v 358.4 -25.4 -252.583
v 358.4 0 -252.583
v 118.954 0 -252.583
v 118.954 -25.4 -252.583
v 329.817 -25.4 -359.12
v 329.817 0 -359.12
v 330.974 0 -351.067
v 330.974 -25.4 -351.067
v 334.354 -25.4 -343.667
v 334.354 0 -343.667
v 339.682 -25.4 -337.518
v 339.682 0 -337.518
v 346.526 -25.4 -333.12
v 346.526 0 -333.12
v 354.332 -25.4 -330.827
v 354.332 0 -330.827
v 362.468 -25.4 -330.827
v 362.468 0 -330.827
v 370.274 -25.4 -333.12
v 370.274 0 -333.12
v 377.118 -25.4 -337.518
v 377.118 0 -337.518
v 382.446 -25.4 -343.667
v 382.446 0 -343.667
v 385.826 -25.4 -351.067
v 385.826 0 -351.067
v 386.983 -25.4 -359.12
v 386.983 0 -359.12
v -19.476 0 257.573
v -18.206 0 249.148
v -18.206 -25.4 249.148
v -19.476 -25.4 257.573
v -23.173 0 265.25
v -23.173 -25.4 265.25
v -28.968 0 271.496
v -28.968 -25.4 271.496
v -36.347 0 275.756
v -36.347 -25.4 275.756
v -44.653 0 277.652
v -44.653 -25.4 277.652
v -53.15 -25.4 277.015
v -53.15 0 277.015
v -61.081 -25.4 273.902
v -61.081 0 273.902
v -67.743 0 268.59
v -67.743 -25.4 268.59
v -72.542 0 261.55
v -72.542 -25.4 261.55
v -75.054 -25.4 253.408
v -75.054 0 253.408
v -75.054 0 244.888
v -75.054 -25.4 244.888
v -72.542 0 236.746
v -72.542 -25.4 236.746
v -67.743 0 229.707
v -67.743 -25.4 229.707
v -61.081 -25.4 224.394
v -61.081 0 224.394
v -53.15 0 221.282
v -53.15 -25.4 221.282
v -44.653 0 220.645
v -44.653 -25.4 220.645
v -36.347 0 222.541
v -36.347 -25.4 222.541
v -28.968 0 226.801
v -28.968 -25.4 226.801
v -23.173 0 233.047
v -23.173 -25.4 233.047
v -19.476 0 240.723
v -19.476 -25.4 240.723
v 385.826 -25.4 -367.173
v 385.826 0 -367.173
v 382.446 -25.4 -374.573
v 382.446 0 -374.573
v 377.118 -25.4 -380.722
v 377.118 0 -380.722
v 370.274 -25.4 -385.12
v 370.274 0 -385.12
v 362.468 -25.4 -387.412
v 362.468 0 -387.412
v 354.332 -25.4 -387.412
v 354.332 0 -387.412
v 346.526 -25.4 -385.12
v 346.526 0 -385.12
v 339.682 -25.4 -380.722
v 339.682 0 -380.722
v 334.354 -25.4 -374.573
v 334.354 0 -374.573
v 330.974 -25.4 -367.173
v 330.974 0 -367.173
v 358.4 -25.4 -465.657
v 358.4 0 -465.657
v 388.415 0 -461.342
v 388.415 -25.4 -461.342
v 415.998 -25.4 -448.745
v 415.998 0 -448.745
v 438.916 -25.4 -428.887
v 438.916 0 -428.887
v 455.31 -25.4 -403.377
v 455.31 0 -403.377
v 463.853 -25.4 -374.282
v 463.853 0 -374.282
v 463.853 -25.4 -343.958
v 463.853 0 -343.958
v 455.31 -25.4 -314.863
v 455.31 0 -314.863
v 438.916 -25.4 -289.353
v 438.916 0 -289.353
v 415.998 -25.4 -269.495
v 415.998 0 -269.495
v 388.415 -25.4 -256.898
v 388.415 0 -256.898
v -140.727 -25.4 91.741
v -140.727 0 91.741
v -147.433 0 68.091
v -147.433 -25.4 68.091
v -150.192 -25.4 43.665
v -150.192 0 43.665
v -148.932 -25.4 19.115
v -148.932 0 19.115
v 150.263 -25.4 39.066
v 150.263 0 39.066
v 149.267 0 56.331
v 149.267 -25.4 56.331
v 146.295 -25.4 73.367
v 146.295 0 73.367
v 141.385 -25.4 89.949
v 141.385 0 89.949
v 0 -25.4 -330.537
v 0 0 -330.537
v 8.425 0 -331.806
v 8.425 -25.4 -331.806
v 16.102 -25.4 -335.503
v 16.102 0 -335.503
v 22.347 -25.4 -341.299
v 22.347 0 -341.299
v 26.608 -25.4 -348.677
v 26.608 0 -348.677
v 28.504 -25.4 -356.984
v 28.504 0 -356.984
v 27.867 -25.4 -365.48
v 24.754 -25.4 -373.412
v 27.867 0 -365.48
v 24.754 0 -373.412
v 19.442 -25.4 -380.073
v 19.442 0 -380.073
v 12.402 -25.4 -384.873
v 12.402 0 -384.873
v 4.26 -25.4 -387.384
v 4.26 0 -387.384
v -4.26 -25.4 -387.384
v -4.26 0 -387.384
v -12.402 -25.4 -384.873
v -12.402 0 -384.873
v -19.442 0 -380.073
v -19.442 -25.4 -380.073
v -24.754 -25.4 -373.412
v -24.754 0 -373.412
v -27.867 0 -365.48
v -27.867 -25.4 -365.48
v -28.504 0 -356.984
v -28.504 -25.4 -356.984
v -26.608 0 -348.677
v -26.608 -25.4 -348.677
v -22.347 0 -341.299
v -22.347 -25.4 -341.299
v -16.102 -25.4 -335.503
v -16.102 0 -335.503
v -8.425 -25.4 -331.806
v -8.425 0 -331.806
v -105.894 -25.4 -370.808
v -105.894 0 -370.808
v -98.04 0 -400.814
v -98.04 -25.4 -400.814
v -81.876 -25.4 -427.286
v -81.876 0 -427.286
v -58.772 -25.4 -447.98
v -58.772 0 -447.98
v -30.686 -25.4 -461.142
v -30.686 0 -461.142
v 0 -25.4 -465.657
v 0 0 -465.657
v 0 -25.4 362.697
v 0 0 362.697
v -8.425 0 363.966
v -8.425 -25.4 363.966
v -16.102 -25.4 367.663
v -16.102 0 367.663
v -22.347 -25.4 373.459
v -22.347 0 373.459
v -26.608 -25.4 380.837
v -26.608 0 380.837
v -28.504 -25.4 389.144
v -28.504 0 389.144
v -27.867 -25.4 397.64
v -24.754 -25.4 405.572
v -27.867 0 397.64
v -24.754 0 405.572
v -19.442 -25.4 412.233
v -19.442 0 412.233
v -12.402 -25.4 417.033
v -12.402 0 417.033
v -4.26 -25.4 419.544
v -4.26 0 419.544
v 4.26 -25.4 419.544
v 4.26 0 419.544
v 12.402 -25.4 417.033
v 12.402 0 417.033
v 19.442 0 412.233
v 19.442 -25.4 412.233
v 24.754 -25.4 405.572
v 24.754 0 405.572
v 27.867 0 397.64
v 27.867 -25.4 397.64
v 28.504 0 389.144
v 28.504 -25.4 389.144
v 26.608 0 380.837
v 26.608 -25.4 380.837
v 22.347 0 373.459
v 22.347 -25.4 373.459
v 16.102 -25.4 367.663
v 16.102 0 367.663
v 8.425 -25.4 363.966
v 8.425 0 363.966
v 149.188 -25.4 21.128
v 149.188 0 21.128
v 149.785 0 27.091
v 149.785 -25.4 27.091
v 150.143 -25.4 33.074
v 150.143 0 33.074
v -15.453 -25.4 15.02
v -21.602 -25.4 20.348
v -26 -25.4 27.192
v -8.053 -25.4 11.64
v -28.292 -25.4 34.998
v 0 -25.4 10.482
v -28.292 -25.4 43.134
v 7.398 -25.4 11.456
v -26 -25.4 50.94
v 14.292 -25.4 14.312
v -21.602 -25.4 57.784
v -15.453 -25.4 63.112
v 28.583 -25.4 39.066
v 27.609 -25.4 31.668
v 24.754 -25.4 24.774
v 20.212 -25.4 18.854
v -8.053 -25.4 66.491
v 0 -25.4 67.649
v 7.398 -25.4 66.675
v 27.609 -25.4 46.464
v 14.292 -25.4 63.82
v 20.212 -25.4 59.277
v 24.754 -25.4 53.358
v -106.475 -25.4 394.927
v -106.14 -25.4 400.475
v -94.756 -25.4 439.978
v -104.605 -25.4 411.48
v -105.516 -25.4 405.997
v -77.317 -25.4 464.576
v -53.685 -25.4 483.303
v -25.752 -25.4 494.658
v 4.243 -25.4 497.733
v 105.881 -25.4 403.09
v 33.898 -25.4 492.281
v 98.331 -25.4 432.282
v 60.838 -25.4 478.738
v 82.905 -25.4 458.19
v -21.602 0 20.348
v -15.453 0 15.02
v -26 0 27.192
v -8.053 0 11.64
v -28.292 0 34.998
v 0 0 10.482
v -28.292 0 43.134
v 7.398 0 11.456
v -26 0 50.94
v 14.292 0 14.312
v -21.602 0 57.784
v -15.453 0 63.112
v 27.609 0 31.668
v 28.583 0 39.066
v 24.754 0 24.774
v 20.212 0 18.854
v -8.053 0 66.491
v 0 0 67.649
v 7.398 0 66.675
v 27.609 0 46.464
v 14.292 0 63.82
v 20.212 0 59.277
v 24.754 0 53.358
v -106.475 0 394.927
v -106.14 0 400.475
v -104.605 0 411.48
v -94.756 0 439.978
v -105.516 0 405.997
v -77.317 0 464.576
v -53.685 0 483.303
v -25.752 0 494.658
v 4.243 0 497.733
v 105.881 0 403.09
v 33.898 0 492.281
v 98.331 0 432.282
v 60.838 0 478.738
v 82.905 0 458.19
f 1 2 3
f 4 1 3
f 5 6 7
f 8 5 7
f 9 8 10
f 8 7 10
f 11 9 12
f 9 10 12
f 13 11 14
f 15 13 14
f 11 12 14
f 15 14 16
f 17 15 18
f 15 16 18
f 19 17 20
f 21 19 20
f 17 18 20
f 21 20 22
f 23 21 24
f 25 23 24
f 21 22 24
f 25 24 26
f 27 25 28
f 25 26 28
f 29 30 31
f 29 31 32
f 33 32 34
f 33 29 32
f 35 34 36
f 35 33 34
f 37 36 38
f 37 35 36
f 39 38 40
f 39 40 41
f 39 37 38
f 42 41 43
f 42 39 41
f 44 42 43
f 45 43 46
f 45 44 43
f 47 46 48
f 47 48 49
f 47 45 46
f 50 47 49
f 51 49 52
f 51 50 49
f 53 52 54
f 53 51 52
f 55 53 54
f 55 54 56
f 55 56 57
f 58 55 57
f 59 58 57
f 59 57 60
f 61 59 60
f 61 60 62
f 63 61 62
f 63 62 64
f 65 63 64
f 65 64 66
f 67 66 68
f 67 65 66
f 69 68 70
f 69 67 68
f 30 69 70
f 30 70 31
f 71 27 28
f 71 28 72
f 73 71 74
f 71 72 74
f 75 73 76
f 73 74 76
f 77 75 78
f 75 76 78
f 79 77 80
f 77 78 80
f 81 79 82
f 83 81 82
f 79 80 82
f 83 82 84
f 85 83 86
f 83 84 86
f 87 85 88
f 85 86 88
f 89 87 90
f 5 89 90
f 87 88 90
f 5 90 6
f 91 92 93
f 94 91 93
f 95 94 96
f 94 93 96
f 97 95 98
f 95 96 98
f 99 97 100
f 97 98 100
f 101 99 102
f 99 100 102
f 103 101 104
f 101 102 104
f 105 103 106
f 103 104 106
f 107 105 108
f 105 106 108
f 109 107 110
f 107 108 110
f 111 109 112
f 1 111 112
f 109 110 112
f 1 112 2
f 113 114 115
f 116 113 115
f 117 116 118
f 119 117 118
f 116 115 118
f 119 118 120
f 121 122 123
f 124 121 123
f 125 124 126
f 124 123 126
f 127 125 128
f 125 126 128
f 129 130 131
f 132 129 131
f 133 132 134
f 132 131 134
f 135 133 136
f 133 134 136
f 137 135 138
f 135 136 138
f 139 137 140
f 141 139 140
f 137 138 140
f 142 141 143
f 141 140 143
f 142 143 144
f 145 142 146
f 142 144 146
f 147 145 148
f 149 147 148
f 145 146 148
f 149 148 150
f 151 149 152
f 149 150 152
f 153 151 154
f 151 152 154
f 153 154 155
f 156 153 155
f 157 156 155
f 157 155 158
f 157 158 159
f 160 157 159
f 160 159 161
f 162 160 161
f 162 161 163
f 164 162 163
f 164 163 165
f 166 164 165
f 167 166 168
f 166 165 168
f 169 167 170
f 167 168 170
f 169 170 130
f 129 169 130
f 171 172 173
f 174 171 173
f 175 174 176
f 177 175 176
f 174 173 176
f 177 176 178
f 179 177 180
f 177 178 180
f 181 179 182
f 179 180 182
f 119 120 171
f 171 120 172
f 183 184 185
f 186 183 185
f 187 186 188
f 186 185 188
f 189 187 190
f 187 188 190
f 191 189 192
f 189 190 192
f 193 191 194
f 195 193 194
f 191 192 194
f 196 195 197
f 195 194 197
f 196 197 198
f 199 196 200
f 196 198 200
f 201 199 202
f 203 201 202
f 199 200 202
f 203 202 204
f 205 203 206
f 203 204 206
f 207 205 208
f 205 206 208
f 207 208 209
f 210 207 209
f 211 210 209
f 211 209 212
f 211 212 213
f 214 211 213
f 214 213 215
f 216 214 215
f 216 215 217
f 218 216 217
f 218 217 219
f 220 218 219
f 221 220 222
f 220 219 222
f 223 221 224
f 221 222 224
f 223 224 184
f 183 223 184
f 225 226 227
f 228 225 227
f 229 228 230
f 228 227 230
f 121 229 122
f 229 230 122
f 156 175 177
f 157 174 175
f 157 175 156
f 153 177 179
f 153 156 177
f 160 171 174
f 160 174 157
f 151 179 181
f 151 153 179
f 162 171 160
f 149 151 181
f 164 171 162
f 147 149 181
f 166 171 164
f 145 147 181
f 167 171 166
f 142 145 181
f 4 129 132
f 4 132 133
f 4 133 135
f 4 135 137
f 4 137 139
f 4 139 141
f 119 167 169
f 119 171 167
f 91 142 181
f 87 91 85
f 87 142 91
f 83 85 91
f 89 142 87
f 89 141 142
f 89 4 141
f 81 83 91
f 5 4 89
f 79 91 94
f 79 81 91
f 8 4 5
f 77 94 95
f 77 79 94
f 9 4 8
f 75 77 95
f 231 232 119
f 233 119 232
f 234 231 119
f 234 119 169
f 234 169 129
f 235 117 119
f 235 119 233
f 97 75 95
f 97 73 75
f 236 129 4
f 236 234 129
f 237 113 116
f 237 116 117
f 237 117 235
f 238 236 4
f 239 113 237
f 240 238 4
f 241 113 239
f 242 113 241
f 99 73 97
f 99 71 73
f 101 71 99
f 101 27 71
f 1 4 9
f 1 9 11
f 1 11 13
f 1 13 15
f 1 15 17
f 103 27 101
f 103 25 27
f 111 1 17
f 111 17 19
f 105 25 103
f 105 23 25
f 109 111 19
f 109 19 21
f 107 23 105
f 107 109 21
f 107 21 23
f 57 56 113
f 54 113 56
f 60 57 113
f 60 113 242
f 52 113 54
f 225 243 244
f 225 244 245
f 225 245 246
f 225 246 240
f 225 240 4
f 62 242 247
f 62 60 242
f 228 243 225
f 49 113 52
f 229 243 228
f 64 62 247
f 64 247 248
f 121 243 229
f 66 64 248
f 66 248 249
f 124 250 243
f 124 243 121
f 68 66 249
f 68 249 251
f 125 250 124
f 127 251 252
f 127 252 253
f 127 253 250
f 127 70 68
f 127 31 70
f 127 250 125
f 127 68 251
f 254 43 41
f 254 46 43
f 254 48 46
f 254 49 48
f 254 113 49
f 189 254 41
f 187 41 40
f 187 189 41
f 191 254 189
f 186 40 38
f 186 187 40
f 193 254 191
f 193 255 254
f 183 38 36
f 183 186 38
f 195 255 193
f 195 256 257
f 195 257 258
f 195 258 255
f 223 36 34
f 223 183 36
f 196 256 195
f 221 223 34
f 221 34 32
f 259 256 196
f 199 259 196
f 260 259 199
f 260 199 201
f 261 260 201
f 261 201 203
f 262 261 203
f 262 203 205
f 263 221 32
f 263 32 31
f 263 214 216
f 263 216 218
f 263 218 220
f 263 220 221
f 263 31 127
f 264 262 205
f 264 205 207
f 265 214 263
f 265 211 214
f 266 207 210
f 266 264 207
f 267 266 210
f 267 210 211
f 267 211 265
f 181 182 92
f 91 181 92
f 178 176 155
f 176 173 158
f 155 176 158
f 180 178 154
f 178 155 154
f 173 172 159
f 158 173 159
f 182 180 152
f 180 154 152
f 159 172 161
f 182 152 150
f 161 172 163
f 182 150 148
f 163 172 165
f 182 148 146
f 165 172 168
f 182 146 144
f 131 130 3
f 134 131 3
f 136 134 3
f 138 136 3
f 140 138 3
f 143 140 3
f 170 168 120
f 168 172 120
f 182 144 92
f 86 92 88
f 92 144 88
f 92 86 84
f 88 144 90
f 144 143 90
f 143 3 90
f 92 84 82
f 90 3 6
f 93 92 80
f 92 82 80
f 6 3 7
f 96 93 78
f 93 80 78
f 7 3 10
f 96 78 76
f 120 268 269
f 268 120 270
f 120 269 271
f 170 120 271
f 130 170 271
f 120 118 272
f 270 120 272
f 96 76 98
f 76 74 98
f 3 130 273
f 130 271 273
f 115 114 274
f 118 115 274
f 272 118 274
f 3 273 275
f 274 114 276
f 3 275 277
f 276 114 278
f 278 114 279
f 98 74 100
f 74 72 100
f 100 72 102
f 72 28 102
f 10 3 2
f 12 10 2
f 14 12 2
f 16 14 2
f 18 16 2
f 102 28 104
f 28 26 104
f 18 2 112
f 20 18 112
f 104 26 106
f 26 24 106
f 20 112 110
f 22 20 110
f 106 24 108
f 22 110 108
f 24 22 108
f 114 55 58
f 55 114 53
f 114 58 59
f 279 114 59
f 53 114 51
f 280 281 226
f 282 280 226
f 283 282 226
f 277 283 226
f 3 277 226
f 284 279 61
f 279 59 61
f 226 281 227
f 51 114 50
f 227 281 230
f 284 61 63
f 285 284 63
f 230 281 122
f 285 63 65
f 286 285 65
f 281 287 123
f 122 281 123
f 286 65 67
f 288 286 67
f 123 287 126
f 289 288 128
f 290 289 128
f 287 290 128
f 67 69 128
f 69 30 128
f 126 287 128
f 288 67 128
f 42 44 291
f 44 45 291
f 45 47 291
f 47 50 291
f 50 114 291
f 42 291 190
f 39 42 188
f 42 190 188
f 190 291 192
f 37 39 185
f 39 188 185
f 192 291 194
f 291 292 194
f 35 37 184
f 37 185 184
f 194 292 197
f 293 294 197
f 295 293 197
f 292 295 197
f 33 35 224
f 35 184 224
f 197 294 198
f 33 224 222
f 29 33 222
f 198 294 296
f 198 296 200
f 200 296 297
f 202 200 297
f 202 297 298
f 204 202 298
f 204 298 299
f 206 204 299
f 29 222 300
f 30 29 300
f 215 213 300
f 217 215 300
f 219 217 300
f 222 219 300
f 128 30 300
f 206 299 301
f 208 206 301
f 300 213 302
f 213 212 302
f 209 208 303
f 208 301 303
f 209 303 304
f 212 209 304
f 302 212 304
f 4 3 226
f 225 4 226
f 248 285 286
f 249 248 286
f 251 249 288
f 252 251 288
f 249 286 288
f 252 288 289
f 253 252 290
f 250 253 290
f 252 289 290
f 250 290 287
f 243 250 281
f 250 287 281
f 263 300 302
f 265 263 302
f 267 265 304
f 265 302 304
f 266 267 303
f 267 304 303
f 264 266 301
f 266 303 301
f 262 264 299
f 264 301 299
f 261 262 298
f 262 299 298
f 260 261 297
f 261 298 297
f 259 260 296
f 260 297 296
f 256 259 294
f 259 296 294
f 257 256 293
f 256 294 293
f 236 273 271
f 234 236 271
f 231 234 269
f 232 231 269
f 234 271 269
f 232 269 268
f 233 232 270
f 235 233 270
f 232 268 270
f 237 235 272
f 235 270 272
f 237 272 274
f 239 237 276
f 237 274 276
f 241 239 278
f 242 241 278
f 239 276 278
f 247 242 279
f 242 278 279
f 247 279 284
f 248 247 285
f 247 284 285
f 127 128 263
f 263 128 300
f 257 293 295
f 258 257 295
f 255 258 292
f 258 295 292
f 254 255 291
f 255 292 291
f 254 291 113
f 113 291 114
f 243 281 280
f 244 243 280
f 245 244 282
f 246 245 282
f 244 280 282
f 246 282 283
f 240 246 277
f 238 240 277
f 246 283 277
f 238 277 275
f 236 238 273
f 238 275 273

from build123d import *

# Parameters (mm, degrees)
F0_R     = 28.5834260478
F1_DEPTH = 25.4


with BuildPart() as f1:
    # F0 (on Front) → F1 (new body)
    with BuildSketch(Plane.XZ):
        with BuildLine():
            Line((0, -111.1967209602), (0, 0))
            Line((0, 0), (0, 10.4824639664))
            ThreePointArc((0, 10.4824639664), (-28.5834260478, 39.0658900142), (0, 67.6493160619))
            Line((0, 67.6493160619), (0, 189.3285009885))
            ThreePointArc((0, 189.3285009885), (-85.6264774345, 162.5444655606), (-140.7274290539, 91.7407698783))
            Line((-140.7274290539, 91.7407698783), (-148.9322934456, 19.1153455136))
            ThreePointArc((-148.9322934456, 19.1153455136), (-98.9470346949, -74.0196377156), (0, -111.1967209602))
        make_face()
        with BuildLine():
            Line((0, 10.4824639664), (0, 0))
            Line((0, 0), (0, -111.1967209602))
            ThreePointArc((0, -111.1967209602), (99.7081962508, -73.3490905589), (149.1880764193, 21.1279383162))
            Line((149.1880764193, 21.1279383162), (141.38502058, 89.9493668256))
            ThreePointArc((141.38502058, 89.9493668256), (86.4088195027, 161.9982623535), (0, 189.3285009885))
            Line((0, 189.3285009885), (0, 67.6493160619))
            ThreePointArc((0, 67.6493160619), (20.2115343879, 59.2774244021), (28.5834260478, 39.0658900142))
            ThreePointArc((28.5834260478, 39.0658900142), (20.2115343879, 18.8543556262), (0, 10.4824639664))
        make_face()
        with BuildLine():
            ThreePointArc((149.1880764193, 21.1279383162), (99.7081962508, -73.3490905589), (0, -111.1967209602))
            Line((0, -111.1967209602), (0, -252.5826123669))
            Line((0, -252.5826123669), (118.9536322579, -252.5826123669))
            Line((118.9536322579, -252.5826123669), (149.1880764193, 21.1279383162))
        make_face()
        with BuildLine():
            Line((0, -252.5826123669), (0, -111.1967209602))
            ThreePointArc((0, -111.1967209602), (-98.9470346949, -74.0196377156), (-148.9322934456, 19.1153455136))
            Line((-148.9322934456, 19.1153455136), (-105.8942795707, -370.8081200368))
            ThreePointArc((-105.8942795707, -370.8081200368), (-79.3581582284, -288.0390857098), (0, -252.5826123669))
        make_face()
        with BuildLine():
            Line((118.9536322579, -252.5826123669), (0, -252.5826123669))
            ThreePointArc((0, -252.5826123669), (75.3332961831, -283.7866853442), (106.5373691604, -359.1199815273))
            Line((106.5373691604, -359.1199815273), (107.1853678233, -359.1199815273))
            Line((107.1853678233, -359.1199815273), (118.9536322579, -252.5826123669))
        make_face()
        with BuildLine():
            Line((0, -330.5365554796), (0, -252.5826123669))
            ThreePointArc((0, -252.5826123669), (-79.3581582284, -288.0390857098), (-105.8942795707, -370.8081200368))
            ThreePointArc((-105.8942795707, -370.8081200368), (-71.0808958175, -438.4781397557), (0, -465.6573506877))
            ThreePointArc((0, -465.6573506877), (75.3332961831, -434.4532777104), (106.5373691604, -359.1199815273))
            Line((106.5373691604, -359.1199815273), (28.5834260478, -359.1199815273))
            ThreePointArc((28.5834260478, -359.1199815273), (-20.2115343879, -379.3315159153), (0, -330.5365554796))
        make_face()
        with BuildLine():
            ThreePointArc((-140.7274290539, 91.7407698783), (-149.3127649454, 55.9345141776), (-148.9322934456, 19.1153455136))
            Line((-148.9322934456, 19.1153455136), (-140.7274290539, 91.7407698783))
        make_face()
        with BuildLine():
            Line((141.38502058, 89.9493668256), (149.1880764193, 21.1279383162))
            ThreePointArc((149.1880764193, 21.1279383162), (149.993736779, 30.0808366528), (150.2626109743, 39.0658900142))
            ThreePointArc((150.2626109743, 39.0658900142), (148.0265763332, 64.891941898), (141.38502058, 89.9493668256))
        make_face()
        with BuildLine():
            ThreePointArc((-140.7274290539, 91.7407698783), (-85.6264774345, 162.5444655606), (0, 189.3285009885))
            Line((0, 189.3285009885), (0, 284.7426560834))
            ThreePointArc((0, 284.7426560834), (-76.6118719963, 317.2473831402), (-106.4749269686, 394.9270726321))
            Line((-106.4749269686, 394.9270726321), (-140.7274290539, 91.7407698783))
        make_face()
        with Locations((-46.7894114554, 249.1482943296)):
            Circle(F0_R, mode=Mode.SUBTRACT)
        with BuildLine():
            Line((0, 284.7426560834), (0, 189.3285009885))
            ThreePointArc((0, 189.3285009885), (86.4088195027, 161.9982623535), (141.38502058, 89.9493668256))
            Line((141.38502058, 89.9493668256), (105.8807391162, 403.0901950914))
            ThreePointArc((105.8807391162, 403.0901950914), (106.3730849835, 397.1942300687), (106.5373691604, 391.2800252438))
            ThreePointArc((106.5373691604, 391.2800252438), (75.3332961831, 315.9467290607), (0, 284.7426560834))
        make_face()
        with BuildLine():
            Line((107.1853678233, -359.1199815273), (106.5373691604, -359.1199815273))
            ThreePointArc((106.5373691604, -359.1199815273), (75.3332961831, -434.4532777104), (0, -465.6573506877))
            Line((0, -465.6573506877), (358.4000170231, -465.6573506877))
            ThreePointArc((358.4000170231, -465.6573506877), (283.06672084, -434.4532777104), (251.8626478627, -359.1199815273))
            Line((251.8626478627, -359.1199815273), (107.1853678233, -359.1199815273))
        make_face()
        with BuildLine():
            Line((358.4000170231, -252.5826123669), (118.9536322579, -252.5826123669))
            Line((118.9536322579, -252.5826123669), (107.1853678233, -359.1199815273))
            Line((107.1853678233, -359.1199815273), (251.8626478627, -359.1199815273))
            ThreePointArc((251.8626478627, -359.1199815273), (283.06672084, -283.7866853442), (358.4000170231, -252.5826123669))
        make_face()
        with BuildLine():
            ThreePointArc((-106.4749269686, 394.9270726321), (-76.6118719963, 317.2473831402), (0, 284.7426560834))
            ThreePointArc((0, 284.7426560834), (75.3332961831, 315.9467290607), (106.5373691604, 391.2800252438))
            ThreePointArc((106.5373691604, 391.2800252438), (106.3730849835, 397.1942300687), (105.8807391162, 403.0901950914))
            ThreePointArc((105.8807391162, 403.0901950914), (4.2430021395, 497.7328690783), (-104.6048877063, 411.4797404785))
            Line((-104.6048877063, 411.4797404785), (-106.4749269686, 394.9270726321))
        make_face()
        with BuildLine():
            ThreePointArc((28.5834260478, 391.2800252438), (20.2115343879, 371.0684908558), (0, 362.696599196))
            ThreePointArc((0, 362.696599196), (-20.2115343879, 411.4915596317), (28.5834260478, 391.2800252438))
        make_face(mode=Mode.SUBTRACT)
        with BuildLine():
            ThreePointArc((464.9373861835, -359.1199815273), (433.7333132062, -283.7866853442), (358.4000170231, -252.5826123669))
            ThreePointArc((358.4000170231, -252.5826123669), (283.06672084, -283.7866853442), (251.8626478627, -359.1199815273))
            ThreePointArc((251.8626478627, -359.1199815273), (283.06672084, -434.4532777104), (358.4000170231, -465.6573506877))
            ThreePointArc((358.4000170231, -465.6573506877), (433.7333132062, -434.4532777104), (464.9373861835, -359.1199815273))
        make_face()
        with BuildLine():
            ThreePointArc((386.9834430709, -359.1199815273), (358.4000170231, -387.7034075751), (329.8165909753, -359.1199815273))
            ThreePointArc((329.8165909753, -359.1199815273), (358.4000170231, -330.5365554796), (386.9834430709, -359.1199815273))
        make_face(mode=Mode.SUBTRACT)
        with BuildLine():
            ThreePointArc((-104.6048877063, 411.4797404785), (-105.8639208796, 403.2400120168), (-106.4749269686, 394.9270726321))
            Line((-106.4749269686, 394.9270726321), (-104.6048877063, 411.4797404785))
        make_face()
        with BuildLine():
            ThreePointArc((106.5373691604, -359.1199815273), (75.3332961831, -283.7866853442), (0, -252.5826123669))
            Line((0, -252.5826123669), (0, -330.5365554796))
            ThreePointArc((0, -330.5365554796), (20.2115343879, -338.9084471394), (28.5834260478, -359.1199815273))
            Line((28.5834260478, -359.1199815273), (106.5373691604, -359.1199815273))
        make_face()
    extrude(amount=F1_DEPTH)


solid = f1.part
